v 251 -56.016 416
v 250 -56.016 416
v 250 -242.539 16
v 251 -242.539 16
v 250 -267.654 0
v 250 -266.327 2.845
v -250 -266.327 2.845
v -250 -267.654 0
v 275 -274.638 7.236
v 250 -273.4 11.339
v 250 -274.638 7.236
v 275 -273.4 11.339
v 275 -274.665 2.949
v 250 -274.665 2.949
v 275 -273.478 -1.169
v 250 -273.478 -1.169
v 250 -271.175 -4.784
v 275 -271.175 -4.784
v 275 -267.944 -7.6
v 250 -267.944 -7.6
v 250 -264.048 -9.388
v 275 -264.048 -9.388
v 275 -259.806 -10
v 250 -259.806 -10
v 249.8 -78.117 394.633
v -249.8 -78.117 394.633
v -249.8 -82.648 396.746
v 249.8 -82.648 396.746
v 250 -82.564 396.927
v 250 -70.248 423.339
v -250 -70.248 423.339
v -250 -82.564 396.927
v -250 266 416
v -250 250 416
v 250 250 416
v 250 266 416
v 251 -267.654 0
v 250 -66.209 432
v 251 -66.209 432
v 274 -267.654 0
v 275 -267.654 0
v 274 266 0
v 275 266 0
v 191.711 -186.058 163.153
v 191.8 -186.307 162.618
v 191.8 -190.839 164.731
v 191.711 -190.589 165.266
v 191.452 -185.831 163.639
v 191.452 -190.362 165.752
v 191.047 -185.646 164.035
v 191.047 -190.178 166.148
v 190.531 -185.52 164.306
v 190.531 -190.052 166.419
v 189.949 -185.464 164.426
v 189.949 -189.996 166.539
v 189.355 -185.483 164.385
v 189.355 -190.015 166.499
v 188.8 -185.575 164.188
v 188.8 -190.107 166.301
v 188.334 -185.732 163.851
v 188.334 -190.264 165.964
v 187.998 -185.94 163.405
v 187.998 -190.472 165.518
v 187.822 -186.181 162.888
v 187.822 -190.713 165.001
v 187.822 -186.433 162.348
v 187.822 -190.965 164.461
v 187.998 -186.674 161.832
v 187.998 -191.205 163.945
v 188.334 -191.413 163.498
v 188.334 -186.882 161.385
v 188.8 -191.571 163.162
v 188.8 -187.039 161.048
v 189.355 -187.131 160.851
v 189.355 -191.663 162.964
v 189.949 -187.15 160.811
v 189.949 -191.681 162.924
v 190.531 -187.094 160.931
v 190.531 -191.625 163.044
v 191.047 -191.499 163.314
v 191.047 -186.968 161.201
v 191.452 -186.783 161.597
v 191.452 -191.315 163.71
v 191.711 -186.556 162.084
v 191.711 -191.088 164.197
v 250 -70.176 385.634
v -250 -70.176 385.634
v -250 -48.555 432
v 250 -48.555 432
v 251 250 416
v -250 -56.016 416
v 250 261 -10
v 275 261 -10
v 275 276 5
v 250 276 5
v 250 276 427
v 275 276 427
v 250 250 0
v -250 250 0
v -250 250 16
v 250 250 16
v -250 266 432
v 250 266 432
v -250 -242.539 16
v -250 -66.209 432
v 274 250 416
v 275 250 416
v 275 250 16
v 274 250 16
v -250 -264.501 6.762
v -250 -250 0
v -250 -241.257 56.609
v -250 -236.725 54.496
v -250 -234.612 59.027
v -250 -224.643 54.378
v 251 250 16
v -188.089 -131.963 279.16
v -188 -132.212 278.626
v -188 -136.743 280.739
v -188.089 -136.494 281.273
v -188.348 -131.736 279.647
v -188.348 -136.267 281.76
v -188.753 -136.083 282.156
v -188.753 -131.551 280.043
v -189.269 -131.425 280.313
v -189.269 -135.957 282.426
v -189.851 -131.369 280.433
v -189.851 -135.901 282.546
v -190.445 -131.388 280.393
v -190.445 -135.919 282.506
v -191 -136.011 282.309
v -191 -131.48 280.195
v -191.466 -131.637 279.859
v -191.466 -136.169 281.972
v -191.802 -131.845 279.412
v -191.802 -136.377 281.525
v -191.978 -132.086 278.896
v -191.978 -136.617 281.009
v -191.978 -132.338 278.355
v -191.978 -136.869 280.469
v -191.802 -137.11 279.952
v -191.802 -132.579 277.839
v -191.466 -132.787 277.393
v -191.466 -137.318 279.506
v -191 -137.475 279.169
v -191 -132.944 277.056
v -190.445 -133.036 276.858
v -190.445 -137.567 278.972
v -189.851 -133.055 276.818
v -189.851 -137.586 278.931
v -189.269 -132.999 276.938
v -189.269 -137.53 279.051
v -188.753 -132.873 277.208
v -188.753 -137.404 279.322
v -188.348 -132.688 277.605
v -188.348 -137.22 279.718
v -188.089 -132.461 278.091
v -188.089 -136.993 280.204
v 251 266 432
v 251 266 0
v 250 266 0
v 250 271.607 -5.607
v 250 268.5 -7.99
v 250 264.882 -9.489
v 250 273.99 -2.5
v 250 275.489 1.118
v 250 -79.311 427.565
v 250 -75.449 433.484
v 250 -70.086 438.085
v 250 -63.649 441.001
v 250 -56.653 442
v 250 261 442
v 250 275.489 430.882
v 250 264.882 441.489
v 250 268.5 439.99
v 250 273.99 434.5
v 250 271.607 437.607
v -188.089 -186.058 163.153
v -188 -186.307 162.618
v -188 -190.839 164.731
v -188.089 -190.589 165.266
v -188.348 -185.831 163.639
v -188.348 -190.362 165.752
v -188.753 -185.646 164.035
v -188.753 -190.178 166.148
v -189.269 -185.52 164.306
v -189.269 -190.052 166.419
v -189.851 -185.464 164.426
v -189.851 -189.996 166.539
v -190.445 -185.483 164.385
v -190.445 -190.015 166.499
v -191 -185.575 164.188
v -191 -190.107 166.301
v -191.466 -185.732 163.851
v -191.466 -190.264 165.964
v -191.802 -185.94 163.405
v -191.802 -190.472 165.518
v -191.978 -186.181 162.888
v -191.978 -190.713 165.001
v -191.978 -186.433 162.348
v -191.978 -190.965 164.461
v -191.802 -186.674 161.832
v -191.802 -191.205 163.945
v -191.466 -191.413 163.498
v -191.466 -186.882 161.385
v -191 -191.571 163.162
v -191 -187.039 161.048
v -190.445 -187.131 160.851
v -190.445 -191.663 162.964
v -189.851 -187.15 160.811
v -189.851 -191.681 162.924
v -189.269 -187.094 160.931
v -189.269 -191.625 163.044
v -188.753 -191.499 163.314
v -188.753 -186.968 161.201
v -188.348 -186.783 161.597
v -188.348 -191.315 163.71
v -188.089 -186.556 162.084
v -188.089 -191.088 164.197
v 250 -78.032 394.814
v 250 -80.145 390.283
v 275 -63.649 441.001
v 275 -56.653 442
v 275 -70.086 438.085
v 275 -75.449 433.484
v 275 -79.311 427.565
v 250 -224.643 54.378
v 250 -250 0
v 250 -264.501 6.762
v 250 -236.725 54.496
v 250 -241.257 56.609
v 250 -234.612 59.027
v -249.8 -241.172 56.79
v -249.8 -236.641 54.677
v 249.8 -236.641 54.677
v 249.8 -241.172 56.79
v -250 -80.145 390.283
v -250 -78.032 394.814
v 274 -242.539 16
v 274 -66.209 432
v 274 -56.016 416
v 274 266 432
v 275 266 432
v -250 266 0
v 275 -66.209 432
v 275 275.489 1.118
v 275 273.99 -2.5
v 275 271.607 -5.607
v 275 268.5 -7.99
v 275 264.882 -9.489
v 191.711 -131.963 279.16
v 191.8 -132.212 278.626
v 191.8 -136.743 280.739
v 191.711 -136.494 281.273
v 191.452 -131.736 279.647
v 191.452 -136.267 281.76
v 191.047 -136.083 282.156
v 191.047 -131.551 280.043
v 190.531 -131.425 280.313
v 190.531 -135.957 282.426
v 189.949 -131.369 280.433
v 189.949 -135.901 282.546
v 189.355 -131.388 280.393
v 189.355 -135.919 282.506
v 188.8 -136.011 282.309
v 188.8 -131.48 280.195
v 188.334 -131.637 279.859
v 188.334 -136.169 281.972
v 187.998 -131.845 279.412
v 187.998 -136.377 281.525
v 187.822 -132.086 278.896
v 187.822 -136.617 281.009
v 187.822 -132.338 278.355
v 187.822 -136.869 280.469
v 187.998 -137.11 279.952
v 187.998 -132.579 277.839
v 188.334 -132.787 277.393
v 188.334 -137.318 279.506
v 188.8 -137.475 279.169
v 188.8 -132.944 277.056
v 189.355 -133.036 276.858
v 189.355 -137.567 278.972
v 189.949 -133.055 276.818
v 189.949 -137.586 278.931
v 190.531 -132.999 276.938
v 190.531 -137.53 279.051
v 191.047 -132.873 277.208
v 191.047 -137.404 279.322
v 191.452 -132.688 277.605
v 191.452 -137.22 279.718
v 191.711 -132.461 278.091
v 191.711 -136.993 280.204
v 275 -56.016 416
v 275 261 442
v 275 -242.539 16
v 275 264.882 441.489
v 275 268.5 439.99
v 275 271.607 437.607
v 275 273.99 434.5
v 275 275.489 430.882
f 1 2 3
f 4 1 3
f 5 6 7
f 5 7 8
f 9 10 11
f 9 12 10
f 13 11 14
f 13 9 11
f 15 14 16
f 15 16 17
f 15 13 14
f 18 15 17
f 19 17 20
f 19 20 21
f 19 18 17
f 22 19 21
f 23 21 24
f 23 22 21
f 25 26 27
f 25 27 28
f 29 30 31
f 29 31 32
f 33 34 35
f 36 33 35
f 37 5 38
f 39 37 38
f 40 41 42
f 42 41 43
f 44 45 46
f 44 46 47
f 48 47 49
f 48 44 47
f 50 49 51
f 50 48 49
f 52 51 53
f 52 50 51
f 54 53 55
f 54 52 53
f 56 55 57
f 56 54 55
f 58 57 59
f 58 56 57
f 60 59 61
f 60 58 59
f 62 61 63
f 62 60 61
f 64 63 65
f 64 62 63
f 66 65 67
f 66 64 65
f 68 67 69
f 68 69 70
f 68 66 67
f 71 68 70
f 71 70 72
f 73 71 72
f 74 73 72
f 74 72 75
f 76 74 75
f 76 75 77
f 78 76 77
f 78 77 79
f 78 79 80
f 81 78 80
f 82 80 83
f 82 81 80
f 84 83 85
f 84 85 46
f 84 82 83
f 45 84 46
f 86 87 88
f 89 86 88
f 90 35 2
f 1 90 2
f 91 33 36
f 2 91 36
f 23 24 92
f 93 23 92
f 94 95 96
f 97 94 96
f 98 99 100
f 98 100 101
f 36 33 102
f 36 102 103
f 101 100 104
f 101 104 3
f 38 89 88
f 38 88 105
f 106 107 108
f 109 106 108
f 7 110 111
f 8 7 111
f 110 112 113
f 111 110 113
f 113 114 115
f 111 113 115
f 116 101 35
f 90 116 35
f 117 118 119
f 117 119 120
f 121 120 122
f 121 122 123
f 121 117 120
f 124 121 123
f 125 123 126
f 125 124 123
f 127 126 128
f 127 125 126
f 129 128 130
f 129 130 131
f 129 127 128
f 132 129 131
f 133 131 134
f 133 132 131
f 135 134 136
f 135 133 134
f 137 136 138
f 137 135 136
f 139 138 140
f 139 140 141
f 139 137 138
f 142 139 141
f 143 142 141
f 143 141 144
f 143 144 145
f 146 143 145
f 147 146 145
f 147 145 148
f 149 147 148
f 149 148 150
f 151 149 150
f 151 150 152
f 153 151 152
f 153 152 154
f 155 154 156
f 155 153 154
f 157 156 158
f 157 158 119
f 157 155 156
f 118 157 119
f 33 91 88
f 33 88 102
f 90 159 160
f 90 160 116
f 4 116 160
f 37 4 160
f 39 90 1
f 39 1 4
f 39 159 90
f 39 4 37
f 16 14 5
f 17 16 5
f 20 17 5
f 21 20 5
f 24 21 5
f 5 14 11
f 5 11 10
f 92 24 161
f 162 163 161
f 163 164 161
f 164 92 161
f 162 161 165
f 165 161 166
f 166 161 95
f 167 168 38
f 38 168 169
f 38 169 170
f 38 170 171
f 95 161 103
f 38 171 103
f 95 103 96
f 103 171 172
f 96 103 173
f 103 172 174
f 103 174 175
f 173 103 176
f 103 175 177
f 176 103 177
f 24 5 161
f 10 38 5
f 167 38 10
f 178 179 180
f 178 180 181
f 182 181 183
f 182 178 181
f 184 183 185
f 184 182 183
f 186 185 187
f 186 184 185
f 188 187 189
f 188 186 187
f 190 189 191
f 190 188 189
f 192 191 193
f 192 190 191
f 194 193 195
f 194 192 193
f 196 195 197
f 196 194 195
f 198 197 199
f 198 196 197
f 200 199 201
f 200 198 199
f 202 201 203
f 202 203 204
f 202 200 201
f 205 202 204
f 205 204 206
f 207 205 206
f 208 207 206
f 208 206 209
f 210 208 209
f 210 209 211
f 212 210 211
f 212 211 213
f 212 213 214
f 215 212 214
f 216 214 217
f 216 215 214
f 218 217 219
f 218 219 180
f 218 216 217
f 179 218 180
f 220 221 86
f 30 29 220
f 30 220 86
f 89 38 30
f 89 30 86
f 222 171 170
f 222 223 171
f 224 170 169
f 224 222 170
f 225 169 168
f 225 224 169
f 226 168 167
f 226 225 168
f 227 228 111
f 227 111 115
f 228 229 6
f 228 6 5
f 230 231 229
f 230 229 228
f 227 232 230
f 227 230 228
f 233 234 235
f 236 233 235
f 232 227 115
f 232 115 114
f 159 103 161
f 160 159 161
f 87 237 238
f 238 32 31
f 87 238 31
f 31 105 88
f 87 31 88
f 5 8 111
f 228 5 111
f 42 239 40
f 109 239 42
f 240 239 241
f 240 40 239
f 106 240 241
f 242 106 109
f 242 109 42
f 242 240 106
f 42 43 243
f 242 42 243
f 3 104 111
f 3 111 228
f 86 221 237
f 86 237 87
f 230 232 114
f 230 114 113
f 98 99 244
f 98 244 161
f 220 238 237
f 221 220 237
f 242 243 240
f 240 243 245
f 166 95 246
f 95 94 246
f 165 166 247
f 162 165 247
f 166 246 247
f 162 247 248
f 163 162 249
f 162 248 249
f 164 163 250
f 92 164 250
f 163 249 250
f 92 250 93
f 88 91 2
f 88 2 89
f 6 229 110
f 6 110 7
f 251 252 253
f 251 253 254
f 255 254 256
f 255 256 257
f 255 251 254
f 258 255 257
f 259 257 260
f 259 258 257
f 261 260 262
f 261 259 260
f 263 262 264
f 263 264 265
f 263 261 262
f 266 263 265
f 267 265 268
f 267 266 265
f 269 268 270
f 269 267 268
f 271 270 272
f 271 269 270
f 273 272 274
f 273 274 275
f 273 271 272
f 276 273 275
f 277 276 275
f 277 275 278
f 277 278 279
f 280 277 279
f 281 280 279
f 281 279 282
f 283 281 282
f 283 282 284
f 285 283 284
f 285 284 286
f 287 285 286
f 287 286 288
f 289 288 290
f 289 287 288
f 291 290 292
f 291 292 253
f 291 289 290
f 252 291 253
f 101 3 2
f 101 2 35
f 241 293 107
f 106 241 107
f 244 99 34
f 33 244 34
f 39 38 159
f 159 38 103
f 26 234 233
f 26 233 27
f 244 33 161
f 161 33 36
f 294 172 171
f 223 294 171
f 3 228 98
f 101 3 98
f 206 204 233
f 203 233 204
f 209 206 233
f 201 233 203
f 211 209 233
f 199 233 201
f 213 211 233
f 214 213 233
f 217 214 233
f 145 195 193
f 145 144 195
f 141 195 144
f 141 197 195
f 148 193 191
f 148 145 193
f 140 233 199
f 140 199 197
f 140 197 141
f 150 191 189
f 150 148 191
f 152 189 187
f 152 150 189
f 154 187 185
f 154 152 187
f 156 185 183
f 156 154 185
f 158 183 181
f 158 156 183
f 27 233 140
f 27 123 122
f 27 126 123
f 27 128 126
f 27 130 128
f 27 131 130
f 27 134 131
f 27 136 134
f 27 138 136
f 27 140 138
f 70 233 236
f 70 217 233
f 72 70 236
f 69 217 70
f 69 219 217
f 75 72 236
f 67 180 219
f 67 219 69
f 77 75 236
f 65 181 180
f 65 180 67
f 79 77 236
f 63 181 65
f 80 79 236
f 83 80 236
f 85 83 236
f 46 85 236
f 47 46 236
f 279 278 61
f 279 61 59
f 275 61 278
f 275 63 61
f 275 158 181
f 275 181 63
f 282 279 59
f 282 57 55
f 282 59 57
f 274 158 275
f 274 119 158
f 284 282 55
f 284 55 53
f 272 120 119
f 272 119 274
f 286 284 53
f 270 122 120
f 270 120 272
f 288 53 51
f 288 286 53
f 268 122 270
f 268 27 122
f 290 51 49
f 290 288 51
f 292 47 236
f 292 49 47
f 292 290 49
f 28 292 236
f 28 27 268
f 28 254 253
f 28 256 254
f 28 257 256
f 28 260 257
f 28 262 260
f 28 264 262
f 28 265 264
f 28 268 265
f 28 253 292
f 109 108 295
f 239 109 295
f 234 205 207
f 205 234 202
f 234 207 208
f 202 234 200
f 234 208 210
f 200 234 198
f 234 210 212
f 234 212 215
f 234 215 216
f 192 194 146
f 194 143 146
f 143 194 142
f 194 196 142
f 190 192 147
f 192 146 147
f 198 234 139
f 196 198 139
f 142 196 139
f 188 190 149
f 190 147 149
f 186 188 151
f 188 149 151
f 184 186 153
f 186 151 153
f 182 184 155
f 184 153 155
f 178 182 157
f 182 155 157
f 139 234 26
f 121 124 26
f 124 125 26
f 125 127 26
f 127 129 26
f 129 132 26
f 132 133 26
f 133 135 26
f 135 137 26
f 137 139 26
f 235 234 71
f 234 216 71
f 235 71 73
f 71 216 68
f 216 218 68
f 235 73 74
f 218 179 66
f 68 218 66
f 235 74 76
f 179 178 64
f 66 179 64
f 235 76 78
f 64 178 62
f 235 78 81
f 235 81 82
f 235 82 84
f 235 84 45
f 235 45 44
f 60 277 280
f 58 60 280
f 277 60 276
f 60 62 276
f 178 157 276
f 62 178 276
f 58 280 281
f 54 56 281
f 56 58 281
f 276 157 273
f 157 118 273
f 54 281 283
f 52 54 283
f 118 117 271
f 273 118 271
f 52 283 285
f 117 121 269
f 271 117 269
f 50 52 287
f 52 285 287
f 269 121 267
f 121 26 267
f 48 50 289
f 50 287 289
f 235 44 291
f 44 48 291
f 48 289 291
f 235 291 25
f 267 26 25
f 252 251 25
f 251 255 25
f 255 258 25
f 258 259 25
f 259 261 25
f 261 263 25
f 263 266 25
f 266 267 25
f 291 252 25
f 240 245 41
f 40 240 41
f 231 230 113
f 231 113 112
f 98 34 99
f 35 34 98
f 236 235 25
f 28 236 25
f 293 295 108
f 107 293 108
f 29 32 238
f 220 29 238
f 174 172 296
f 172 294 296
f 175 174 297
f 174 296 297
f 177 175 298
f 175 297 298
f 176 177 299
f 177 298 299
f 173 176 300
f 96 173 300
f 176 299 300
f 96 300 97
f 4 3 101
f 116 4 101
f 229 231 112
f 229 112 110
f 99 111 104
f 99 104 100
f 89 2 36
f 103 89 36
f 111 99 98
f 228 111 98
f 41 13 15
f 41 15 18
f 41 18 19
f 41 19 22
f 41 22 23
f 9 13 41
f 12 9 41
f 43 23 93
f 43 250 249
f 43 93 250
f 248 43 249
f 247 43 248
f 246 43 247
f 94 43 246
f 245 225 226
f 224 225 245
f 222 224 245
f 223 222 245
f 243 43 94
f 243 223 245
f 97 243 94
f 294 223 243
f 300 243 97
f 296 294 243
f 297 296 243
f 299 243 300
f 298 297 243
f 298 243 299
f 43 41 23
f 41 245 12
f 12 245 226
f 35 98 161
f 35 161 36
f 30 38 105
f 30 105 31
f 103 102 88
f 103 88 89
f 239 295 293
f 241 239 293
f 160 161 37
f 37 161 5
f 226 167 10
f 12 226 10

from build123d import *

# Parameters (mm, degrees)
F0_W      = 500
F0_H      = 500
F1_DEPTH  = 16
F3_W      = 500
F3_H      = 416
F4_DEPTH  = 16
F5_SIZE2  = 7.460913
F5_SIZE   = 15.99999
F7_DEPTH  = 500
F8_W      = 500
F8_H      = 500
F9_DEPTH  = 16
F11_DEPTH = 500
F13_DEPTH = 500.001
F15_DEPTH = 25
F16_R     = 15
F17_R     = 25
F18_R     = 15
F20_DEPTH = 1
F21_W     = 499.6
F21_H     = 375.1
F21_R     = 2
F22_DEPTH = 5
F24_DEPTH = 1


# Not quite as in the source:
# - a fillet or chamfer is up to 0.001 mm smaller than in the source, because OpenCascade refuses the exact size


with BuildPart() as f1:
    # F0 (on Top) → F1 (new body)
    with BuildSketch(Plane.XY):
        Rectangle(F0_W, F0_H)
    extrude(amount=F1_DEPTH)

    # F5 (size 16 and 7.4609225305 in the source; OpenCascade refuses exactly that, so slightly less here)
    f5_edges = [f1.edges().sort_by_distance(p)[0] for p in [
        (0, -250, 16),
    ]]
    f5_side = f1.faces().sort_by_distance((0, -250, 8))[0]
    chamfer(f5_edges, length=F5_SIZE, length2=F5_SIZE2, reference=f5_side)


with BuildPart() as f4:
    # F3 (on offset) → F4 (new body)
    with BuildSketch(Plane.XZ.offset(-250)):
        with Locations((0, 208)):
            Rectangle(F3_W, F3_H)
    extrude(amount=-F4_DEPTH)


with BuildPart() as f7:
    # F6 (on face) → F7 (new body, through all)
    with BuildSketch(Plane.YZ.offset(250)):
        Polygon((-264.5146755492, 0), (-250, 0), (-224.6429042956, 54.3784672222), (-234.612289953, 59.0272681013), (-236.7253812617, 54.4957291662), (-241.2569201968, 56.6088204749), (-264.5009245926, 6.7618921879), (-266.3272911232, 2.8452365235), (-267.6540467034, 0), align=None)
    extrude(amount=-F7_DEPTH)


with BuildPart() as f9:
    # F8 (on face) → F9 (new body)
    with BuildSketch(Plane.XY.offset(416)):
        with Locations((0, 16)):
            Rectangle(F8_W, F8_H)
    extrude(amount=F9_DEPTH)

    # F12 (on face) → F13 (cut, through all)
    with BuildSketch(Plane.YZ.offset(250)):
        Polygon((-78.702301391, 367.3491001344), (-31.9454936648, 467.6193978841), (-288.1607642735, 474.7963037545), (-288.1607642735, 367.3491001344), align=None)
    extrude(amount=-F13_DEPTH, mode=Mode.SUBTRACT)


with BuildPart() as f11:
    # F10 (on face) → F11 (new body, through all)
    with BuildSketch(Plane.YZ.offset(250)):
        Polygon((-70.1759296293, 385.6339633841), (-48.555091677, 432), (-56.6530844683, 432), (-66.2091383804, 432), (-70.2477012739, 423.3392739261), (-82.5637629132, 396.9273945071), (-78.032223978, 394.8143031984), (-80.1453152867, 390.2827642632), align=None)
    extrude(amount=-F11_DEPTH)


with BuildPart() as f15:
    # F14 (on face) → F15 (new body)
    with BuildSketch(Plane.YZ.offset(250)):
        Polygon((276, -10), (276, 442), (-72.5798409885, 442), (-283.3509024746, -10), align=None)
    extrude(amount=F15_DEPTH)

    # F16
    f16_edges = [f15.edges().sort_by_distance(p)[0] for p in [
        (262.5, 276, -10),
        (262.5, -283.350902, -10),
    ]]
    fillet(f16_edges, radius=F16_R)

    # F17
    f17_edges = [f15.edges().sort_by_distance(p)[0] for p in [
        (262.5, -72.579841, 442),
    ]]
    fillet(f17_edges, radius=F17_R)

    # F18
    f18_edges = [f15.edges().sort_by_distance(p)[0] for p in [
        (262.5, 276, 442),
    ]]
    fillet(f18_edges, radius=F18_R)

    # F19 (on face) → F20 (cut)
    with BuildSketch(Plane(origin=(250, 0, 0), x_dir=(0, -1, 0), z_dir=(-1, 0, 0))):
        Polygon((-266, 0), (267.6540467034, 0), (66.2091383804, 432), (-266, 432), align=None)
        Polygon((-250, 16), (-250, 416), (56.0160142075, 416), (242.5390774695, 16), align=None, mode=Mode.SUBTRACT)
    extrude(amount=-F20_DEPTH, mode=Mode.SUBTRACT)

    # F23 (on face) → F24 (cut)
    with BuildSketch(Plane.YZ.offset(275)):
        Polygon((266, 0), (266, 432), (-66.2091383804, 432), (-267.6540467034, 0), align=None)
        Polygon((-56.0160142075, 416), (250, 416), (250, 16), (-242.5390774695, 16), align=None, mode=Mode.SUBTRACT)
    extrude(amount=-F24_DEPTH, mode=Mode.SUBTRACT)


with BuildPart() as f22:
    # F21 (on face) → F22 (new body)
    with BuildSketch(Plane(origin=(0, -215.3178368682, 100.404356269), x_dir=(1, 0, 0), z_dir=(0, -0.906307787, 0.4226182617))):
        with Locations((0, 137.0954345648)):
            Rectangle(F21_W, F21_H)
        with Locations((-190, 68.6454345648)):
            Circle(F21_R, mode=Mode.SUBTRACT)
        with Locations((189.8, 68.6454345648)):
            Circle(F21_R, mode=Mode.SUBTRACT)
        with Locations((-190, 196.6454345648)):
            Circle(F21_R, mode=Mode.SUBTRACT)
        with Locations((189.8, 196.6454345648)):
            Circle(F21_R, mode=Mode.SUBTRACT)
    extrude(amount=F22_DEPTH)


solid = Compound([f1.part, f4.part, f7.part, f9.part, f11.part, f15.part, f22.part])
